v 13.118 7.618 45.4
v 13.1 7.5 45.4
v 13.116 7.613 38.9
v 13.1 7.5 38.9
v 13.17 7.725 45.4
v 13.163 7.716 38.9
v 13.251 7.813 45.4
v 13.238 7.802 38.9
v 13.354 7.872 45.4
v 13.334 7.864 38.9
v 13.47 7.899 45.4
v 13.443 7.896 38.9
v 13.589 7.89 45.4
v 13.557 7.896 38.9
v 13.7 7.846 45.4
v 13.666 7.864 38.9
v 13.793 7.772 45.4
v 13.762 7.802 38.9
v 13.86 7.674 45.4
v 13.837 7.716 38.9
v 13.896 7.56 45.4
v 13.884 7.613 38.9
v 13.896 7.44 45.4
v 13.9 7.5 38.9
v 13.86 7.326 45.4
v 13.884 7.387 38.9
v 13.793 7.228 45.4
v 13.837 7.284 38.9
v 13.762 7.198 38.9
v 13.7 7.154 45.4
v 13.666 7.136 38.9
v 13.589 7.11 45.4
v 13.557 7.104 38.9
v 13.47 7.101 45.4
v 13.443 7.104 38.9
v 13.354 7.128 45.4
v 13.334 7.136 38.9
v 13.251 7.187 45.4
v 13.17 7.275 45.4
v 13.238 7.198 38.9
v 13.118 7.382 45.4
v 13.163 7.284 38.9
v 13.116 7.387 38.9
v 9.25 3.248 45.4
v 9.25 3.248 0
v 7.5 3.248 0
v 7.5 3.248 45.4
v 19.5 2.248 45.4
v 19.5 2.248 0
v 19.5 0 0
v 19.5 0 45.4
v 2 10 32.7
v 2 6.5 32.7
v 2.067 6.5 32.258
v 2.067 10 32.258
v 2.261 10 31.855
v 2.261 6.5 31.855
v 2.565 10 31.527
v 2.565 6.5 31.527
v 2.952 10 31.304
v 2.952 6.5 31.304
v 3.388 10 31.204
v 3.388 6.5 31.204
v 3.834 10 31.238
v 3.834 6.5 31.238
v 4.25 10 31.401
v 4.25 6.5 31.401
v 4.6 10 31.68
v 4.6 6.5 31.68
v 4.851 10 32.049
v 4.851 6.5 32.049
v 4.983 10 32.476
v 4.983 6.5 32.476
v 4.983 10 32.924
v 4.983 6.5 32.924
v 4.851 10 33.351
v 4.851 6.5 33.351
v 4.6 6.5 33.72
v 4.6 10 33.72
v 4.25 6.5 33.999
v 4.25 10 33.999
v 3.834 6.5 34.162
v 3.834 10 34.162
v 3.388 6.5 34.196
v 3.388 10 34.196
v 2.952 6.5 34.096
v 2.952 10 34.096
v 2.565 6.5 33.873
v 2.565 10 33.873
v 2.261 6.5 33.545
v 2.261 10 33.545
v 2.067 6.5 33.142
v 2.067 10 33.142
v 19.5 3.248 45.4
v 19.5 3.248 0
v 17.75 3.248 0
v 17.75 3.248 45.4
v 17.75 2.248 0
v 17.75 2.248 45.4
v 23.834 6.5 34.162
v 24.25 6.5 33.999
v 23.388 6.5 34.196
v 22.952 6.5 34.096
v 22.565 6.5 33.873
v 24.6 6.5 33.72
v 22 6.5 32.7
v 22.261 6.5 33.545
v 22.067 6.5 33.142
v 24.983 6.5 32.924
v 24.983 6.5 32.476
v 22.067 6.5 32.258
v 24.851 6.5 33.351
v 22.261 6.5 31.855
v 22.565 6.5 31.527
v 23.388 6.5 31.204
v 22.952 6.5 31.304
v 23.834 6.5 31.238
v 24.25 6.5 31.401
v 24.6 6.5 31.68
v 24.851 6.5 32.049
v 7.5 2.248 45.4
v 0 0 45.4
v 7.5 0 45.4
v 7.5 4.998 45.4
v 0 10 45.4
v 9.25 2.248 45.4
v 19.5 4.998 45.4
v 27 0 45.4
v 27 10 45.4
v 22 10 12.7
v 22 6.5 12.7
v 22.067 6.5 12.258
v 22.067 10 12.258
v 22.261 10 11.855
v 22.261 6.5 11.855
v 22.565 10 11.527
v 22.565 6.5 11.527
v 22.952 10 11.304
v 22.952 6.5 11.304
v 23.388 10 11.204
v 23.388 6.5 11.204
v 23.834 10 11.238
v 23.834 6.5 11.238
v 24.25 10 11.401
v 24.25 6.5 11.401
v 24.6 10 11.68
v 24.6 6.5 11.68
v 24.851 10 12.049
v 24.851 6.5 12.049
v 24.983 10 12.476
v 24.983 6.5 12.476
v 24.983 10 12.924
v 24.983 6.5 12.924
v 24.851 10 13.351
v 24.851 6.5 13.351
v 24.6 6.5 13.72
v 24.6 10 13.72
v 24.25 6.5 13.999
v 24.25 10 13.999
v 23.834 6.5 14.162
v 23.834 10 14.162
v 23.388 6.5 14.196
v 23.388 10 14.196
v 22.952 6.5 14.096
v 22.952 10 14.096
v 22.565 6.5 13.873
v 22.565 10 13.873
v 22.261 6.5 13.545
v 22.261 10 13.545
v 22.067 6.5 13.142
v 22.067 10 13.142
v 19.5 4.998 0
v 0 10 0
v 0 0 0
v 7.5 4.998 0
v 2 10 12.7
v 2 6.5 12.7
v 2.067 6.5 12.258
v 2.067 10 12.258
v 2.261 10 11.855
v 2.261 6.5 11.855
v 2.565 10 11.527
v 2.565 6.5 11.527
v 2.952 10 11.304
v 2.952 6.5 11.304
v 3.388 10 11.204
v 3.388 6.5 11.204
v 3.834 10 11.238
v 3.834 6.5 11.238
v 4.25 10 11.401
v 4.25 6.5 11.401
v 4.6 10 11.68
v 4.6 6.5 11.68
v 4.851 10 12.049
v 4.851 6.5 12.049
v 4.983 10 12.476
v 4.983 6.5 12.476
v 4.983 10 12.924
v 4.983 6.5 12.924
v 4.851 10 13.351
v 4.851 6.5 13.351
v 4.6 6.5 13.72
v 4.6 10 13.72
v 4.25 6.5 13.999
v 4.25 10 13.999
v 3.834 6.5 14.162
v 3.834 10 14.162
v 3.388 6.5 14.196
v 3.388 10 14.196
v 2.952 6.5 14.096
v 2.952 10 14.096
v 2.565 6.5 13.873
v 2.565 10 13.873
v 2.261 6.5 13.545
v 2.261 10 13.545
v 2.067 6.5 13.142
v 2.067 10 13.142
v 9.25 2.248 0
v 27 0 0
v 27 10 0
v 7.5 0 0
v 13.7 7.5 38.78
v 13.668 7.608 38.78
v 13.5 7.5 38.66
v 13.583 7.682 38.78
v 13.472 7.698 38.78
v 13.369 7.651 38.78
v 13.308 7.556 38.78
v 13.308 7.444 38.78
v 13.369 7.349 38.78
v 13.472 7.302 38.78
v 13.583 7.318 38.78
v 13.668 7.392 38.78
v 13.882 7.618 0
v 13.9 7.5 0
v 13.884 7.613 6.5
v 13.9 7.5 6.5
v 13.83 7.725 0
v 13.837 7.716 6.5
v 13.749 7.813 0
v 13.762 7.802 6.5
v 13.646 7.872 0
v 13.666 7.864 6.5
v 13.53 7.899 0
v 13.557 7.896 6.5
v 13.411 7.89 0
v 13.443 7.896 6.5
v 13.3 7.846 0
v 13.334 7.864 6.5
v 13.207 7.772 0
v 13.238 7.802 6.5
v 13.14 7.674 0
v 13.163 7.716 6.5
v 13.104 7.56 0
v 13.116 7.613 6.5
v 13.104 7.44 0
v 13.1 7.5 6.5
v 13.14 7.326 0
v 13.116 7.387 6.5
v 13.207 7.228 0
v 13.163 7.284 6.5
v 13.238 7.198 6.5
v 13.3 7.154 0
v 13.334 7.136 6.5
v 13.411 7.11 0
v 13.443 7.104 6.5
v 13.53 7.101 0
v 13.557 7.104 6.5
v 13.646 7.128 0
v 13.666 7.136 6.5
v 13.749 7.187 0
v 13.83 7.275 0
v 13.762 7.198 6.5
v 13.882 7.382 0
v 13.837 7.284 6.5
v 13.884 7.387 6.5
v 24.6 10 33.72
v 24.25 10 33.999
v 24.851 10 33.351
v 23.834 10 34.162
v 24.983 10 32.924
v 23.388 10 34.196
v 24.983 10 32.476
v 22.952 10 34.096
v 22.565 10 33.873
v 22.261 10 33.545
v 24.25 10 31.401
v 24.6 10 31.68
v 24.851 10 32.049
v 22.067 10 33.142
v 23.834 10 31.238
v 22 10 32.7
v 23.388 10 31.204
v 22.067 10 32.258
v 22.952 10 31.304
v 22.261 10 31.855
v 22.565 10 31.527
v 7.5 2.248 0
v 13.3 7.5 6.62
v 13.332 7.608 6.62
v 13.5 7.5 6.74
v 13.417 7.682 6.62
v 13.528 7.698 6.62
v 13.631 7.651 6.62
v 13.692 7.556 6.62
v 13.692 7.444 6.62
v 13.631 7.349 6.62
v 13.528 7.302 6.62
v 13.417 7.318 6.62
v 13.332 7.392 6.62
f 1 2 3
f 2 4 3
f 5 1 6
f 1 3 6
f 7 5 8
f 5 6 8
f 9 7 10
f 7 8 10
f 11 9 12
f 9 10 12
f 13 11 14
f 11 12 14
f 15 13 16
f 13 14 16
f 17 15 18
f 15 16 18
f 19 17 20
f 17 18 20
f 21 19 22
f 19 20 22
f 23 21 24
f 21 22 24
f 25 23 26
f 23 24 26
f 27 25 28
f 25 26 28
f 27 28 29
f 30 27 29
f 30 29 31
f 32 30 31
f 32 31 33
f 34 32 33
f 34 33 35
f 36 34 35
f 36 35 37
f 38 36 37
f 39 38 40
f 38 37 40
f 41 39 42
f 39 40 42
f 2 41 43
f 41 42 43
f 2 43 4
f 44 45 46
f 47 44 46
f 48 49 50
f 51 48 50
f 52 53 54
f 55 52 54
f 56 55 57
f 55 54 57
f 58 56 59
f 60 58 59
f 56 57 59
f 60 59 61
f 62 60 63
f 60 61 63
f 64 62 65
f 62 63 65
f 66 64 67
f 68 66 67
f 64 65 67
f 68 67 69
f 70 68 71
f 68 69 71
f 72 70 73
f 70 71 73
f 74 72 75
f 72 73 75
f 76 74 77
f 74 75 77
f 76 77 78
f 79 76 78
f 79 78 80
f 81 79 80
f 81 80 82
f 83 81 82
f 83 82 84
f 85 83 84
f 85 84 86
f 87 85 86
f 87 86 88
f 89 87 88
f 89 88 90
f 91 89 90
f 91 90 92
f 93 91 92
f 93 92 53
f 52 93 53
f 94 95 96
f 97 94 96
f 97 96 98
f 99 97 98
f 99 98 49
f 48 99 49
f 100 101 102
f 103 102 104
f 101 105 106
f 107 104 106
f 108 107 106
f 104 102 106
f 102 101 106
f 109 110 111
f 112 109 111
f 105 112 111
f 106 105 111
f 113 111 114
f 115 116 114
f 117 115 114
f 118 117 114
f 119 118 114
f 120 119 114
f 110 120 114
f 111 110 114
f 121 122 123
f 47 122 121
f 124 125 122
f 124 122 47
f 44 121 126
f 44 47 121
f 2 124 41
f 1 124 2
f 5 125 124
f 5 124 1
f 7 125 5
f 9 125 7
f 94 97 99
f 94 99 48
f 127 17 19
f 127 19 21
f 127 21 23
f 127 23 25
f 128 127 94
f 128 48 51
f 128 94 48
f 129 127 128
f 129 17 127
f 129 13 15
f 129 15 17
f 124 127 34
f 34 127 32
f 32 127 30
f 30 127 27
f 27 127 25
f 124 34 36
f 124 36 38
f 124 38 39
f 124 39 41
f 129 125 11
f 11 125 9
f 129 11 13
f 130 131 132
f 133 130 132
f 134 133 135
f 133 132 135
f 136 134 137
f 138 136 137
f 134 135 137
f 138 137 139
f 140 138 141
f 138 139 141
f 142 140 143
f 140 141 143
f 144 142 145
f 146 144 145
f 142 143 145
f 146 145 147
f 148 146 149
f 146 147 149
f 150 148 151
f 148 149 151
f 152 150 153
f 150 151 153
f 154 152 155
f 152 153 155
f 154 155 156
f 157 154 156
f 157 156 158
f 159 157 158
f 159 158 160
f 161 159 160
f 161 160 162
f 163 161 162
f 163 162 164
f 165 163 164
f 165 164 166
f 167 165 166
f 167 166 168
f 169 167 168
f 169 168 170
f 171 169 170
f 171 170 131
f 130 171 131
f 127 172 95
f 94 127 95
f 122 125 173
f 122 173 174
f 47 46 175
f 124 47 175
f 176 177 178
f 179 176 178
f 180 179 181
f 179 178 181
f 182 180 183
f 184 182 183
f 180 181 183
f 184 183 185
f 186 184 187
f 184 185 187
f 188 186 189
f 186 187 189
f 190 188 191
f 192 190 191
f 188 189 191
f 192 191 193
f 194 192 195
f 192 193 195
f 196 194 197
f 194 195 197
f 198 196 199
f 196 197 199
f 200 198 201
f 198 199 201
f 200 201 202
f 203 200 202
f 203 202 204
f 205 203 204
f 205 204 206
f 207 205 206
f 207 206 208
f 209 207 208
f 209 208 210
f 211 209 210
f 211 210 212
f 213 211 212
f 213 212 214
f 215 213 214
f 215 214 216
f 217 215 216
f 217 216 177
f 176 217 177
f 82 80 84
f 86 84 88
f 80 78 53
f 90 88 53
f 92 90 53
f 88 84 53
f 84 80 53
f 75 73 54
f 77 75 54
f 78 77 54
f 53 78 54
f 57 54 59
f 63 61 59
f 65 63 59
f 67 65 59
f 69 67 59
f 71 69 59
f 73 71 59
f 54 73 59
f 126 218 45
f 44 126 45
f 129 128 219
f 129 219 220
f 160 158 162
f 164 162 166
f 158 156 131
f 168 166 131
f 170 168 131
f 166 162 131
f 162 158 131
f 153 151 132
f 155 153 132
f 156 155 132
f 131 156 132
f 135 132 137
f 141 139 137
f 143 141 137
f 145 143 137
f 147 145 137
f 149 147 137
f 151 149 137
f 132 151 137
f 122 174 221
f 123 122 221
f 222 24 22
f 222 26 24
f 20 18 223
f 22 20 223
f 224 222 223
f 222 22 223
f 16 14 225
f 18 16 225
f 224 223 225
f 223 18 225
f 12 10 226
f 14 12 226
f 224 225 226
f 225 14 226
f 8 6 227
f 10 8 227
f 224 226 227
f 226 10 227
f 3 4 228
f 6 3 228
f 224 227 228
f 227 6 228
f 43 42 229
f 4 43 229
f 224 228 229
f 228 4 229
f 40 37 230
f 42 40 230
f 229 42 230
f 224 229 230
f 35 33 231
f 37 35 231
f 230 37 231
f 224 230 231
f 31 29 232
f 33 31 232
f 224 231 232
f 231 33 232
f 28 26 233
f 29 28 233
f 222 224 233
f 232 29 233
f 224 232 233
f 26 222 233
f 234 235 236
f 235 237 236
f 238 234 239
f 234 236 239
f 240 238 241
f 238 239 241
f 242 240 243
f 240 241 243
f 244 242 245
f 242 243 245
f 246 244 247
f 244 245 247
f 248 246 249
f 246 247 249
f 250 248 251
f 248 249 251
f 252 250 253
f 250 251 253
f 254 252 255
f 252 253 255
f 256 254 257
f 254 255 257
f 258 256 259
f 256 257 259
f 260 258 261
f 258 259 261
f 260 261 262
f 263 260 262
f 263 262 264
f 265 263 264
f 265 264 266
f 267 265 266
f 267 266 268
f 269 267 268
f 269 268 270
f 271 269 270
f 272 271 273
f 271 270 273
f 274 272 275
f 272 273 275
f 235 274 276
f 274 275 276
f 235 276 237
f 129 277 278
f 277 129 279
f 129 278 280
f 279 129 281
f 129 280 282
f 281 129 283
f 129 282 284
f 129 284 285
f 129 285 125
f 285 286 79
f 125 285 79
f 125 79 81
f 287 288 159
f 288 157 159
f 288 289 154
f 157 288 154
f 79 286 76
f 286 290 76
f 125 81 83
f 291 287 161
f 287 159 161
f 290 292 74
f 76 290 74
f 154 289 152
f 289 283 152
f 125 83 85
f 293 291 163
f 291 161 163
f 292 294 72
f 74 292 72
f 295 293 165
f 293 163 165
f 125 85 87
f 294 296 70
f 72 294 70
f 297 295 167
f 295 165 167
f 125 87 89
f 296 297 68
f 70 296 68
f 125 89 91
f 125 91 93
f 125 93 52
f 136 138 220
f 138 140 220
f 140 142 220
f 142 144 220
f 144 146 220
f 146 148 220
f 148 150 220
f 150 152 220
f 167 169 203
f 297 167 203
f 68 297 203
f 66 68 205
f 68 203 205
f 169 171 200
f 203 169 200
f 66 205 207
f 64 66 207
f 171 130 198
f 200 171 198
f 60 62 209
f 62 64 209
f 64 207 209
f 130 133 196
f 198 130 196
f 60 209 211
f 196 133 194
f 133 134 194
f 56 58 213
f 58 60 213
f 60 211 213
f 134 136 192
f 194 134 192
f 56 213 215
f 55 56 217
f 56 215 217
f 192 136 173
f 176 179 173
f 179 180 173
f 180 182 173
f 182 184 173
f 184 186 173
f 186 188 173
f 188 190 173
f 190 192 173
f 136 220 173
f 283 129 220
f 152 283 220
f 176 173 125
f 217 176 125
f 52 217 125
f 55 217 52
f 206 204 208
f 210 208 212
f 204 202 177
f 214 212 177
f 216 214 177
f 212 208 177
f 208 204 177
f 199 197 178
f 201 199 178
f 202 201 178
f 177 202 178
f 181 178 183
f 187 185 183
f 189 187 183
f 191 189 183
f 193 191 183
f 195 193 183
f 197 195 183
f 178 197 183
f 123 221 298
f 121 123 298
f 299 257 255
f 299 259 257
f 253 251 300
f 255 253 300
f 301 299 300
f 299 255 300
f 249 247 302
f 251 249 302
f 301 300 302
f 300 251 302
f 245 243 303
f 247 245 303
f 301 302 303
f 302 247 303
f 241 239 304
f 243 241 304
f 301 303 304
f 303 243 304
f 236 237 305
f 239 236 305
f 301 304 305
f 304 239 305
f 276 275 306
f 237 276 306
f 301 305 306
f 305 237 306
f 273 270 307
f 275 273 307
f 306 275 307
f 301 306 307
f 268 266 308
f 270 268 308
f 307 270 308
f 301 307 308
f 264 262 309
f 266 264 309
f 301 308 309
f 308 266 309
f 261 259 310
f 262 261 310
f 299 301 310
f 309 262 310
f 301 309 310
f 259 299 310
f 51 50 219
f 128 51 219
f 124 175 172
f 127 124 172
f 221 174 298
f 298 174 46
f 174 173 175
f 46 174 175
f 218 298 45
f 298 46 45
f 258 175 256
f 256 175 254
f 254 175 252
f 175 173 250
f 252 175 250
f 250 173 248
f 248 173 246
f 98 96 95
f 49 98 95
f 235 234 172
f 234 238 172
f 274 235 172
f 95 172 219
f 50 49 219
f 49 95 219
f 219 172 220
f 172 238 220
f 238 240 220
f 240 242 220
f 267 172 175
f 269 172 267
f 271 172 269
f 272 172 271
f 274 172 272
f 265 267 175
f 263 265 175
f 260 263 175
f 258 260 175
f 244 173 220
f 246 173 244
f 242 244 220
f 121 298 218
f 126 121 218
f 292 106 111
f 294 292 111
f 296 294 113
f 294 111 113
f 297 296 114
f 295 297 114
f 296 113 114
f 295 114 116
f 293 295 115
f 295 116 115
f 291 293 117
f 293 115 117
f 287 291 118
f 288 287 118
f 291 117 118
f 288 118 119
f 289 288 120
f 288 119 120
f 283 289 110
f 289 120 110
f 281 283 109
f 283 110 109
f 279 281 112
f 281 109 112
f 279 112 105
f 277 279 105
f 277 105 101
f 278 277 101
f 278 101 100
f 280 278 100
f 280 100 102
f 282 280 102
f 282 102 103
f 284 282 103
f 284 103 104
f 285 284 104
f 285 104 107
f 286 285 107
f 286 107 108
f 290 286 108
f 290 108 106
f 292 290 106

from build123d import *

# Parameters (mm, degrees)
DODANIE_WYCI_GNI_CIE1_DEPTH    = 45.4
OTWORY_USTALAJ_CE_1_0MM1_D     = 0.8
OTWORY_USTALAJ_CE_1_0MM1_DEPTH = 6.5
OTWORY_USTALAJ_CE_1_0MM1_TIP   = 0.240344248
OTWORY_USTALAJ_CE_1_0MM2_D     = 0.8
OTWORY_USTALAJ_CE_1_0MM2_DEPTH = 6.5
OTWORY_USTALAJ_CE_1_0MM2_TIP   = 0.240344248
F_3_0MM_DOWEL_HOLE1_D          = 3
F_3_0MM_DOWEL_HOLE1_DEPTH      = 3.5


with BuildPart() as part:
    # Szkic1 → Dodanie-wyciągnięcie1 (new body)
    with BuildSketch(Plane.XY):
        Polygon((7.5, 0), (7.5, 2.247882756), (9.25, 2.247882756), (9.25, 3.247882756), (7.5, 3.247882756), (7.5, 4.997882756), (19.5, 4.997882756), (19.5, 3.247882756), (17.75, 3.247882756), (17.75, 2.247882756), (19.5, 2.247882756), (19.5, 0), (27, 0), (27, 10), (0, 10), (0, 0), align=None)
    extrude(amount=DODANIE_WYCI_GNI_CIE1_DEPTH)

    # Otwory ustalające Ø1.0mm1
    with Locations(Plane.XY.offset(45.4)):
        with Locations((13.5, 7.5)):
            Hole(OTWORY_USTALAJ_CE_1_0MM1_D / 2, depth=OTWORY_USTALAJ_CE_1_0MM1_DEPTH)
            with Locations((0, 0, -(OTWORY_USTALAJ_CE_1_0MM1_DEPTH + OTWORY_USTALAJ_CE_1_0MM1_TIP / 2))):  # 118° drill point
                Cone(0, OTWORY_USTALAJ_CE_1_0MM1_D / 2, OTWORY_USTALAJ_CE_1_0MM1_TIP, mode=Mode.SUBTRACT)

    # Otwory ustalające Ø1.0mm2
    with Locations(Plane(origin=(0, 0, 0), x_dir=(-1, 0, 0), z_dir=(0, 0, -1))):
        with Locations((-13.5, 7.5)):
            Hole(OTWORY_USTALAJ_CE_1_0MM2_D / 2, depth=OTWORY_USTALAJ_CE_1_0MM2_DEPTH)
            with Locations((0, 0, -(OTWORY_USTALAJ_CE_1_0MM2_DEPTH + OTWORY_USTALAJ_CE_1_0MM2_TIP / 2))):  # 118° drill point
                Cone(0, OTWORY_USTALAJ_CE_1_0MM2_D / 2, OTWORY_USTALAJ_CE_1_0MM2_TIP, mode=Mode.SUBTRACT)

    # Ø3.0mm Dowel Hole1
    with Locations(Plane(origin=(0, 10, 0), x_dir=(1, 0, 0), z_dir=(0, 1, 0))):
        with Locations((3.5, -32.7), (23.5, -32.7), (23.5, -12.7), (3.5, -12.7)):
            Hole(F_3_0MM_DOWEL_HOLE1_D / 2, depth=F_3_0MM_DOWEL_HOLE1_DEPTH)


solid = part.part
